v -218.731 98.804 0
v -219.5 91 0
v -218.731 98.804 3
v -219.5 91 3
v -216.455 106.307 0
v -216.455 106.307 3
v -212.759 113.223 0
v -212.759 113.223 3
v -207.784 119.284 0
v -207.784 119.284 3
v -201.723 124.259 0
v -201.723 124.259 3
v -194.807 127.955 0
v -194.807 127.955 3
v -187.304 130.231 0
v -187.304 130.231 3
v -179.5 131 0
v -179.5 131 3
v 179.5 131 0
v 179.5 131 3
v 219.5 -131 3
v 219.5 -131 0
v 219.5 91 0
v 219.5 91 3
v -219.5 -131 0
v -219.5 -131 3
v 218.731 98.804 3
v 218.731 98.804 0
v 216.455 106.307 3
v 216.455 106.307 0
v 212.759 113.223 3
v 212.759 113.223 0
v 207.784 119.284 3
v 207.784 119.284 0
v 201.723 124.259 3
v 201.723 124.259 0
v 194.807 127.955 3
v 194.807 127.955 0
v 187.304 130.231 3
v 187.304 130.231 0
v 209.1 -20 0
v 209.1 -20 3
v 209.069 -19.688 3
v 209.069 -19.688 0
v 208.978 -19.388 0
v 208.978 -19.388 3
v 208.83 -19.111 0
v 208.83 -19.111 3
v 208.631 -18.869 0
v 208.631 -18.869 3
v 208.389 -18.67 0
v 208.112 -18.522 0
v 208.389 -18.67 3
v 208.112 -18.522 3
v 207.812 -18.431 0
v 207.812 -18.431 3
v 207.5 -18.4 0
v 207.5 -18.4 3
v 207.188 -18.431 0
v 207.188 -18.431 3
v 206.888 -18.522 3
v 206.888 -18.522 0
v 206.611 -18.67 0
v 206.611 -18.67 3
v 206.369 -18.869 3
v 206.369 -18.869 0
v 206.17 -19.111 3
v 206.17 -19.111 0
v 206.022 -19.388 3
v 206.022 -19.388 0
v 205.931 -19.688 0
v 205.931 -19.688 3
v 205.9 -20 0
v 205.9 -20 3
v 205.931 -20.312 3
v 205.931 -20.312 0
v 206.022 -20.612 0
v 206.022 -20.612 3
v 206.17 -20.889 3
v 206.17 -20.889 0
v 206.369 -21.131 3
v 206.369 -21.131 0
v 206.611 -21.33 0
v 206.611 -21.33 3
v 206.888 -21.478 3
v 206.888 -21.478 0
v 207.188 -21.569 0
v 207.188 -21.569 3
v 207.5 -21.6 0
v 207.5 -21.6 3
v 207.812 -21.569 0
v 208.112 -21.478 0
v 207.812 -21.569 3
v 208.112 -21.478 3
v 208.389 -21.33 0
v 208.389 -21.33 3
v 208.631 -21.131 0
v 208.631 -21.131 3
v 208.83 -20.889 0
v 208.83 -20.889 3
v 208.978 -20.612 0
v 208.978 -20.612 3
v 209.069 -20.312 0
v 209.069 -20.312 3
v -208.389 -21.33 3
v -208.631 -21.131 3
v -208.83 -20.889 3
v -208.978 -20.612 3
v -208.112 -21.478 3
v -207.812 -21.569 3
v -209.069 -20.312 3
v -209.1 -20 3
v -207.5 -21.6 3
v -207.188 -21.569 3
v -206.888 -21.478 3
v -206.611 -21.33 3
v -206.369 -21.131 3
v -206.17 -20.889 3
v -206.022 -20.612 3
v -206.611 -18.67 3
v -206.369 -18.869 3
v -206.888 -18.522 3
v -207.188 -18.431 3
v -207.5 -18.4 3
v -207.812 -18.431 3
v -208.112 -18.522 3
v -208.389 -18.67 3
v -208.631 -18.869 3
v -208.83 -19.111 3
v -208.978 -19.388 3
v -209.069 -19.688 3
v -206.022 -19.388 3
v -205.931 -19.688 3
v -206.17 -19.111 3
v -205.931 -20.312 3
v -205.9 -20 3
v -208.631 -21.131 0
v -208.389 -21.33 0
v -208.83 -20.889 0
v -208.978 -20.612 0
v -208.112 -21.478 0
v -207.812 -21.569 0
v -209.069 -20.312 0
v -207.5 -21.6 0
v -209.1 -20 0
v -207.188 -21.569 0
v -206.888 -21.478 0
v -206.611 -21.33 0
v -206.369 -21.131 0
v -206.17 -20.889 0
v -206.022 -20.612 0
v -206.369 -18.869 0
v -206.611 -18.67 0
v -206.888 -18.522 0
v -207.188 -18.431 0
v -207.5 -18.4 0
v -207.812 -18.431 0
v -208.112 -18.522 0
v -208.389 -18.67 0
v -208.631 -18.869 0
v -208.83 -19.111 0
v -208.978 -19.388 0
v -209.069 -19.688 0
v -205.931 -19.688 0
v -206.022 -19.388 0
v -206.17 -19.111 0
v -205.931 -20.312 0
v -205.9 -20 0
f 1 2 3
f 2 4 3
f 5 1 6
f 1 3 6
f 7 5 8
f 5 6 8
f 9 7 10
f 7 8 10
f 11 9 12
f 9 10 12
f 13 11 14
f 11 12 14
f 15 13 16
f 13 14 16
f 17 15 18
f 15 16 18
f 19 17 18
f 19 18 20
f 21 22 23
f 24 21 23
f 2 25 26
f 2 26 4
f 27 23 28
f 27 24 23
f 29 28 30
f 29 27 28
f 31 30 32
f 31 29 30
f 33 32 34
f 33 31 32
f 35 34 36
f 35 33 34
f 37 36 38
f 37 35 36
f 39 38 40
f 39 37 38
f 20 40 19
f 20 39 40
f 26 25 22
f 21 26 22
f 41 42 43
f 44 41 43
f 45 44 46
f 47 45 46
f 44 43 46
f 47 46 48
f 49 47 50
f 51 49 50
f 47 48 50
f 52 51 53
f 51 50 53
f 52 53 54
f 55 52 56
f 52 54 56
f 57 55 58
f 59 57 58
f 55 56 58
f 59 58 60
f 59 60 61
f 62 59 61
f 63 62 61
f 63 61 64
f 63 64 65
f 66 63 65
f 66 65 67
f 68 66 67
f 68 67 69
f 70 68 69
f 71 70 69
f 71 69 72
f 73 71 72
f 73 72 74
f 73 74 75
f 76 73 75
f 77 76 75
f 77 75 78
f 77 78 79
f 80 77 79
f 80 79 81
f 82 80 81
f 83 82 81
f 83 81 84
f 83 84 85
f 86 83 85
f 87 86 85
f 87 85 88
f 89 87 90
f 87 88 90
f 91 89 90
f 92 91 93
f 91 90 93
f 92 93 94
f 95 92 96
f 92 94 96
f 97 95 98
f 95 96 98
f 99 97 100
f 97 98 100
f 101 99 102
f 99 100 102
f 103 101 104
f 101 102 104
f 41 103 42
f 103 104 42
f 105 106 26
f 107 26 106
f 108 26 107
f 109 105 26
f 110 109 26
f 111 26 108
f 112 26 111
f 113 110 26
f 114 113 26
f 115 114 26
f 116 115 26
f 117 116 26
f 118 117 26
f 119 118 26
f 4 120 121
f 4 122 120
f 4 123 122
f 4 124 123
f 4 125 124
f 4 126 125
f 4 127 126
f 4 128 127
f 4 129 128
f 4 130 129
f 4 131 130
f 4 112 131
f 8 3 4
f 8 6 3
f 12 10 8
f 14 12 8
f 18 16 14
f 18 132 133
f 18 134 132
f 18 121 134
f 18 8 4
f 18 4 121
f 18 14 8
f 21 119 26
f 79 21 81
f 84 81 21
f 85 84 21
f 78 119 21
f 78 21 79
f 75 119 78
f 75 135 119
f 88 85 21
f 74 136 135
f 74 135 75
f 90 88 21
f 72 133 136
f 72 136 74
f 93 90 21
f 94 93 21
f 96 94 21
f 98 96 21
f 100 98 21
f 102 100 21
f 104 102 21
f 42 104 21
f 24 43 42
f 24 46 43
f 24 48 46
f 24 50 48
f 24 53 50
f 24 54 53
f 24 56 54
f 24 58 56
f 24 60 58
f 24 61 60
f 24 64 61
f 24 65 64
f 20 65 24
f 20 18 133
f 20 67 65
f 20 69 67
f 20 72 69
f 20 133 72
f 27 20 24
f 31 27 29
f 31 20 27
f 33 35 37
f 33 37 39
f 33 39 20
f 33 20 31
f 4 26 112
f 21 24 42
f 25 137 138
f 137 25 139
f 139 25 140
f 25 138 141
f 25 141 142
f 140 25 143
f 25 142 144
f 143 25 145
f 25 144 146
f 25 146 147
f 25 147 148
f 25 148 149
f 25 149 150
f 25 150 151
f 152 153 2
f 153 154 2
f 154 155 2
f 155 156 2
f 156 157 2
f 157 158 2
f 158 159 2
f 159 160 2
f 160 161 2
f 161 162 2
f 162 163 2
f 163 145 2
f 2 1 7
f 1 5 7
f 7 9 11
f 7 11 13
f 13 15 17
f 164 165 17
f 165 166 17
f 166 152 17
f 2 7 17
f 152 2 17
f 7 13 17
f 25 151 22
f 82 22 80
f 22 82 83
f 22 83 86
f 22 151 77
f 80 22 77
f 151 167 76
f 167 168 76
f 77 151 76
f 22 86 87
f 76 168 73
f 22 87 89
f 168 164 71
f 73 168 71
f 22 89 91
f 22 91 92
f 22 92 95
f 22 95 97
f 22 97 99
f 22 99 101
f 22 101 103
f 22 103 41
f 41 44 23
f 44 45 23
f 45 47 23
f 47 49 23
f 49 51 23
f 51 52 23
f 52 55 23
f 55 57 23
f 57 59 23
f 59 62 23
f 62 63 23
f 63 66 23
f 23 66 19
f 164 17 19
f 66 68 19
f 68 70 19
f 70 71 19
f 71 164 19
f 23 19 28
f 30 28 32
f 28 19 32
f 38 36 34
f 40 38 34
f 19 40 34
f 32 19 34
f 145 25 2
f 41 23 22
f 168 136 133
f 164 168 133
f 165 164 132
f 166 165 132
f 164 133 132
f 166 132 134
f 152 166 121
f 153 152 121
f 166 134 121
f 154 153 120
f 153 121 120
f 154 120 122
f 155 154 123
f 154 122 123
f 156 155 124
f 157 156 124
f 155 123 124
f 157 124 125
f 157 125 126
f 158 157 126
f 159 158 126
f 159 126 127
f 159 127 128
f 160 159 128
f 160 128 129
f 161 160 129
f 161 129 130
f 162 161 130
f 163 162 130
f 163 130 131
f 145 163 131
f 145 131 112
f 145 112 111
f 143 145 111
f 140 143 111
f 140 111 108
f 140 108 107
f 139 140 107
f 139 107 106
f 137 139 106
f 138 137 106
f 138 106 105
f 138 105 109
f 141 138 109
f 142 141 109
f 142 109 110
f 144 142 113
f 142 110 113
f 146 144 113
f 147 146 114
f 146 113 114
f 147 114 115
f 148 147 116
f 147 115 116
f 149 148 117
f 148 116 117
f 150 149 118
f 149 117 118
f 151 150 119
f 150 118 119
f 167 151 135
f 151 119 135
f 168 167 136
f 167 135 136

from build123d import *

# Parameters (mm, degrees)
ESQUISSE1_W        = 439
ESQUISSE1_H        = 262
BOSS_EXTRU_1_DEPTH = 3
FILLET1_R          = 40
SKETCH1_R          = 1.6
CUT_EXTRUDE1_DEPTH = 256.636949598
SKETCH2_R          = 1.6
CUT_EXTRUDE2_DEPTH = 256.636949598


with BuildPart() as part:
    # Esquisse1 → Boss.-Extru.1 (new body)
    with BuildSketch(Plane.XY):
        Rectangle(ESQUISSE1_W, ESQUISSE1_H)
    extrude(amount=BOSS_EXTRU_1_DEPTH)

    # Fillet1
    fillet1_edges = [part.edges().sort_by_distance(p)[0] for p in [
        (-219.5, 131, 1.5),
        (219.5, 131, 1.5),
    ]]
    fillet(fillet1_edges, radius=FILLET1_R)

    # Sketch1 → Cut-Extrude1 (cut, through all)
    with BuildSketch(Plane.XY.offset(3)):
        with Locations((-207.5, -20)):
            Circle(SKETCH1_R)
    extrude(amount=-CUT_EXTRUDE1_DEPTH, mode=Mode.SUBTRACT)

    # Sketch2 → Cut-Extrude2 (cut, through all)
    with BuildSketch(Plane.XY.offset(3)):
        with Locations((207.5, -20)):
            Circle(SKETCH2_R)
    extrude(amount=-CUT_EXTRUDE2_DEPTH, mode=Mode.SUBTRACT)


solid = part.part
